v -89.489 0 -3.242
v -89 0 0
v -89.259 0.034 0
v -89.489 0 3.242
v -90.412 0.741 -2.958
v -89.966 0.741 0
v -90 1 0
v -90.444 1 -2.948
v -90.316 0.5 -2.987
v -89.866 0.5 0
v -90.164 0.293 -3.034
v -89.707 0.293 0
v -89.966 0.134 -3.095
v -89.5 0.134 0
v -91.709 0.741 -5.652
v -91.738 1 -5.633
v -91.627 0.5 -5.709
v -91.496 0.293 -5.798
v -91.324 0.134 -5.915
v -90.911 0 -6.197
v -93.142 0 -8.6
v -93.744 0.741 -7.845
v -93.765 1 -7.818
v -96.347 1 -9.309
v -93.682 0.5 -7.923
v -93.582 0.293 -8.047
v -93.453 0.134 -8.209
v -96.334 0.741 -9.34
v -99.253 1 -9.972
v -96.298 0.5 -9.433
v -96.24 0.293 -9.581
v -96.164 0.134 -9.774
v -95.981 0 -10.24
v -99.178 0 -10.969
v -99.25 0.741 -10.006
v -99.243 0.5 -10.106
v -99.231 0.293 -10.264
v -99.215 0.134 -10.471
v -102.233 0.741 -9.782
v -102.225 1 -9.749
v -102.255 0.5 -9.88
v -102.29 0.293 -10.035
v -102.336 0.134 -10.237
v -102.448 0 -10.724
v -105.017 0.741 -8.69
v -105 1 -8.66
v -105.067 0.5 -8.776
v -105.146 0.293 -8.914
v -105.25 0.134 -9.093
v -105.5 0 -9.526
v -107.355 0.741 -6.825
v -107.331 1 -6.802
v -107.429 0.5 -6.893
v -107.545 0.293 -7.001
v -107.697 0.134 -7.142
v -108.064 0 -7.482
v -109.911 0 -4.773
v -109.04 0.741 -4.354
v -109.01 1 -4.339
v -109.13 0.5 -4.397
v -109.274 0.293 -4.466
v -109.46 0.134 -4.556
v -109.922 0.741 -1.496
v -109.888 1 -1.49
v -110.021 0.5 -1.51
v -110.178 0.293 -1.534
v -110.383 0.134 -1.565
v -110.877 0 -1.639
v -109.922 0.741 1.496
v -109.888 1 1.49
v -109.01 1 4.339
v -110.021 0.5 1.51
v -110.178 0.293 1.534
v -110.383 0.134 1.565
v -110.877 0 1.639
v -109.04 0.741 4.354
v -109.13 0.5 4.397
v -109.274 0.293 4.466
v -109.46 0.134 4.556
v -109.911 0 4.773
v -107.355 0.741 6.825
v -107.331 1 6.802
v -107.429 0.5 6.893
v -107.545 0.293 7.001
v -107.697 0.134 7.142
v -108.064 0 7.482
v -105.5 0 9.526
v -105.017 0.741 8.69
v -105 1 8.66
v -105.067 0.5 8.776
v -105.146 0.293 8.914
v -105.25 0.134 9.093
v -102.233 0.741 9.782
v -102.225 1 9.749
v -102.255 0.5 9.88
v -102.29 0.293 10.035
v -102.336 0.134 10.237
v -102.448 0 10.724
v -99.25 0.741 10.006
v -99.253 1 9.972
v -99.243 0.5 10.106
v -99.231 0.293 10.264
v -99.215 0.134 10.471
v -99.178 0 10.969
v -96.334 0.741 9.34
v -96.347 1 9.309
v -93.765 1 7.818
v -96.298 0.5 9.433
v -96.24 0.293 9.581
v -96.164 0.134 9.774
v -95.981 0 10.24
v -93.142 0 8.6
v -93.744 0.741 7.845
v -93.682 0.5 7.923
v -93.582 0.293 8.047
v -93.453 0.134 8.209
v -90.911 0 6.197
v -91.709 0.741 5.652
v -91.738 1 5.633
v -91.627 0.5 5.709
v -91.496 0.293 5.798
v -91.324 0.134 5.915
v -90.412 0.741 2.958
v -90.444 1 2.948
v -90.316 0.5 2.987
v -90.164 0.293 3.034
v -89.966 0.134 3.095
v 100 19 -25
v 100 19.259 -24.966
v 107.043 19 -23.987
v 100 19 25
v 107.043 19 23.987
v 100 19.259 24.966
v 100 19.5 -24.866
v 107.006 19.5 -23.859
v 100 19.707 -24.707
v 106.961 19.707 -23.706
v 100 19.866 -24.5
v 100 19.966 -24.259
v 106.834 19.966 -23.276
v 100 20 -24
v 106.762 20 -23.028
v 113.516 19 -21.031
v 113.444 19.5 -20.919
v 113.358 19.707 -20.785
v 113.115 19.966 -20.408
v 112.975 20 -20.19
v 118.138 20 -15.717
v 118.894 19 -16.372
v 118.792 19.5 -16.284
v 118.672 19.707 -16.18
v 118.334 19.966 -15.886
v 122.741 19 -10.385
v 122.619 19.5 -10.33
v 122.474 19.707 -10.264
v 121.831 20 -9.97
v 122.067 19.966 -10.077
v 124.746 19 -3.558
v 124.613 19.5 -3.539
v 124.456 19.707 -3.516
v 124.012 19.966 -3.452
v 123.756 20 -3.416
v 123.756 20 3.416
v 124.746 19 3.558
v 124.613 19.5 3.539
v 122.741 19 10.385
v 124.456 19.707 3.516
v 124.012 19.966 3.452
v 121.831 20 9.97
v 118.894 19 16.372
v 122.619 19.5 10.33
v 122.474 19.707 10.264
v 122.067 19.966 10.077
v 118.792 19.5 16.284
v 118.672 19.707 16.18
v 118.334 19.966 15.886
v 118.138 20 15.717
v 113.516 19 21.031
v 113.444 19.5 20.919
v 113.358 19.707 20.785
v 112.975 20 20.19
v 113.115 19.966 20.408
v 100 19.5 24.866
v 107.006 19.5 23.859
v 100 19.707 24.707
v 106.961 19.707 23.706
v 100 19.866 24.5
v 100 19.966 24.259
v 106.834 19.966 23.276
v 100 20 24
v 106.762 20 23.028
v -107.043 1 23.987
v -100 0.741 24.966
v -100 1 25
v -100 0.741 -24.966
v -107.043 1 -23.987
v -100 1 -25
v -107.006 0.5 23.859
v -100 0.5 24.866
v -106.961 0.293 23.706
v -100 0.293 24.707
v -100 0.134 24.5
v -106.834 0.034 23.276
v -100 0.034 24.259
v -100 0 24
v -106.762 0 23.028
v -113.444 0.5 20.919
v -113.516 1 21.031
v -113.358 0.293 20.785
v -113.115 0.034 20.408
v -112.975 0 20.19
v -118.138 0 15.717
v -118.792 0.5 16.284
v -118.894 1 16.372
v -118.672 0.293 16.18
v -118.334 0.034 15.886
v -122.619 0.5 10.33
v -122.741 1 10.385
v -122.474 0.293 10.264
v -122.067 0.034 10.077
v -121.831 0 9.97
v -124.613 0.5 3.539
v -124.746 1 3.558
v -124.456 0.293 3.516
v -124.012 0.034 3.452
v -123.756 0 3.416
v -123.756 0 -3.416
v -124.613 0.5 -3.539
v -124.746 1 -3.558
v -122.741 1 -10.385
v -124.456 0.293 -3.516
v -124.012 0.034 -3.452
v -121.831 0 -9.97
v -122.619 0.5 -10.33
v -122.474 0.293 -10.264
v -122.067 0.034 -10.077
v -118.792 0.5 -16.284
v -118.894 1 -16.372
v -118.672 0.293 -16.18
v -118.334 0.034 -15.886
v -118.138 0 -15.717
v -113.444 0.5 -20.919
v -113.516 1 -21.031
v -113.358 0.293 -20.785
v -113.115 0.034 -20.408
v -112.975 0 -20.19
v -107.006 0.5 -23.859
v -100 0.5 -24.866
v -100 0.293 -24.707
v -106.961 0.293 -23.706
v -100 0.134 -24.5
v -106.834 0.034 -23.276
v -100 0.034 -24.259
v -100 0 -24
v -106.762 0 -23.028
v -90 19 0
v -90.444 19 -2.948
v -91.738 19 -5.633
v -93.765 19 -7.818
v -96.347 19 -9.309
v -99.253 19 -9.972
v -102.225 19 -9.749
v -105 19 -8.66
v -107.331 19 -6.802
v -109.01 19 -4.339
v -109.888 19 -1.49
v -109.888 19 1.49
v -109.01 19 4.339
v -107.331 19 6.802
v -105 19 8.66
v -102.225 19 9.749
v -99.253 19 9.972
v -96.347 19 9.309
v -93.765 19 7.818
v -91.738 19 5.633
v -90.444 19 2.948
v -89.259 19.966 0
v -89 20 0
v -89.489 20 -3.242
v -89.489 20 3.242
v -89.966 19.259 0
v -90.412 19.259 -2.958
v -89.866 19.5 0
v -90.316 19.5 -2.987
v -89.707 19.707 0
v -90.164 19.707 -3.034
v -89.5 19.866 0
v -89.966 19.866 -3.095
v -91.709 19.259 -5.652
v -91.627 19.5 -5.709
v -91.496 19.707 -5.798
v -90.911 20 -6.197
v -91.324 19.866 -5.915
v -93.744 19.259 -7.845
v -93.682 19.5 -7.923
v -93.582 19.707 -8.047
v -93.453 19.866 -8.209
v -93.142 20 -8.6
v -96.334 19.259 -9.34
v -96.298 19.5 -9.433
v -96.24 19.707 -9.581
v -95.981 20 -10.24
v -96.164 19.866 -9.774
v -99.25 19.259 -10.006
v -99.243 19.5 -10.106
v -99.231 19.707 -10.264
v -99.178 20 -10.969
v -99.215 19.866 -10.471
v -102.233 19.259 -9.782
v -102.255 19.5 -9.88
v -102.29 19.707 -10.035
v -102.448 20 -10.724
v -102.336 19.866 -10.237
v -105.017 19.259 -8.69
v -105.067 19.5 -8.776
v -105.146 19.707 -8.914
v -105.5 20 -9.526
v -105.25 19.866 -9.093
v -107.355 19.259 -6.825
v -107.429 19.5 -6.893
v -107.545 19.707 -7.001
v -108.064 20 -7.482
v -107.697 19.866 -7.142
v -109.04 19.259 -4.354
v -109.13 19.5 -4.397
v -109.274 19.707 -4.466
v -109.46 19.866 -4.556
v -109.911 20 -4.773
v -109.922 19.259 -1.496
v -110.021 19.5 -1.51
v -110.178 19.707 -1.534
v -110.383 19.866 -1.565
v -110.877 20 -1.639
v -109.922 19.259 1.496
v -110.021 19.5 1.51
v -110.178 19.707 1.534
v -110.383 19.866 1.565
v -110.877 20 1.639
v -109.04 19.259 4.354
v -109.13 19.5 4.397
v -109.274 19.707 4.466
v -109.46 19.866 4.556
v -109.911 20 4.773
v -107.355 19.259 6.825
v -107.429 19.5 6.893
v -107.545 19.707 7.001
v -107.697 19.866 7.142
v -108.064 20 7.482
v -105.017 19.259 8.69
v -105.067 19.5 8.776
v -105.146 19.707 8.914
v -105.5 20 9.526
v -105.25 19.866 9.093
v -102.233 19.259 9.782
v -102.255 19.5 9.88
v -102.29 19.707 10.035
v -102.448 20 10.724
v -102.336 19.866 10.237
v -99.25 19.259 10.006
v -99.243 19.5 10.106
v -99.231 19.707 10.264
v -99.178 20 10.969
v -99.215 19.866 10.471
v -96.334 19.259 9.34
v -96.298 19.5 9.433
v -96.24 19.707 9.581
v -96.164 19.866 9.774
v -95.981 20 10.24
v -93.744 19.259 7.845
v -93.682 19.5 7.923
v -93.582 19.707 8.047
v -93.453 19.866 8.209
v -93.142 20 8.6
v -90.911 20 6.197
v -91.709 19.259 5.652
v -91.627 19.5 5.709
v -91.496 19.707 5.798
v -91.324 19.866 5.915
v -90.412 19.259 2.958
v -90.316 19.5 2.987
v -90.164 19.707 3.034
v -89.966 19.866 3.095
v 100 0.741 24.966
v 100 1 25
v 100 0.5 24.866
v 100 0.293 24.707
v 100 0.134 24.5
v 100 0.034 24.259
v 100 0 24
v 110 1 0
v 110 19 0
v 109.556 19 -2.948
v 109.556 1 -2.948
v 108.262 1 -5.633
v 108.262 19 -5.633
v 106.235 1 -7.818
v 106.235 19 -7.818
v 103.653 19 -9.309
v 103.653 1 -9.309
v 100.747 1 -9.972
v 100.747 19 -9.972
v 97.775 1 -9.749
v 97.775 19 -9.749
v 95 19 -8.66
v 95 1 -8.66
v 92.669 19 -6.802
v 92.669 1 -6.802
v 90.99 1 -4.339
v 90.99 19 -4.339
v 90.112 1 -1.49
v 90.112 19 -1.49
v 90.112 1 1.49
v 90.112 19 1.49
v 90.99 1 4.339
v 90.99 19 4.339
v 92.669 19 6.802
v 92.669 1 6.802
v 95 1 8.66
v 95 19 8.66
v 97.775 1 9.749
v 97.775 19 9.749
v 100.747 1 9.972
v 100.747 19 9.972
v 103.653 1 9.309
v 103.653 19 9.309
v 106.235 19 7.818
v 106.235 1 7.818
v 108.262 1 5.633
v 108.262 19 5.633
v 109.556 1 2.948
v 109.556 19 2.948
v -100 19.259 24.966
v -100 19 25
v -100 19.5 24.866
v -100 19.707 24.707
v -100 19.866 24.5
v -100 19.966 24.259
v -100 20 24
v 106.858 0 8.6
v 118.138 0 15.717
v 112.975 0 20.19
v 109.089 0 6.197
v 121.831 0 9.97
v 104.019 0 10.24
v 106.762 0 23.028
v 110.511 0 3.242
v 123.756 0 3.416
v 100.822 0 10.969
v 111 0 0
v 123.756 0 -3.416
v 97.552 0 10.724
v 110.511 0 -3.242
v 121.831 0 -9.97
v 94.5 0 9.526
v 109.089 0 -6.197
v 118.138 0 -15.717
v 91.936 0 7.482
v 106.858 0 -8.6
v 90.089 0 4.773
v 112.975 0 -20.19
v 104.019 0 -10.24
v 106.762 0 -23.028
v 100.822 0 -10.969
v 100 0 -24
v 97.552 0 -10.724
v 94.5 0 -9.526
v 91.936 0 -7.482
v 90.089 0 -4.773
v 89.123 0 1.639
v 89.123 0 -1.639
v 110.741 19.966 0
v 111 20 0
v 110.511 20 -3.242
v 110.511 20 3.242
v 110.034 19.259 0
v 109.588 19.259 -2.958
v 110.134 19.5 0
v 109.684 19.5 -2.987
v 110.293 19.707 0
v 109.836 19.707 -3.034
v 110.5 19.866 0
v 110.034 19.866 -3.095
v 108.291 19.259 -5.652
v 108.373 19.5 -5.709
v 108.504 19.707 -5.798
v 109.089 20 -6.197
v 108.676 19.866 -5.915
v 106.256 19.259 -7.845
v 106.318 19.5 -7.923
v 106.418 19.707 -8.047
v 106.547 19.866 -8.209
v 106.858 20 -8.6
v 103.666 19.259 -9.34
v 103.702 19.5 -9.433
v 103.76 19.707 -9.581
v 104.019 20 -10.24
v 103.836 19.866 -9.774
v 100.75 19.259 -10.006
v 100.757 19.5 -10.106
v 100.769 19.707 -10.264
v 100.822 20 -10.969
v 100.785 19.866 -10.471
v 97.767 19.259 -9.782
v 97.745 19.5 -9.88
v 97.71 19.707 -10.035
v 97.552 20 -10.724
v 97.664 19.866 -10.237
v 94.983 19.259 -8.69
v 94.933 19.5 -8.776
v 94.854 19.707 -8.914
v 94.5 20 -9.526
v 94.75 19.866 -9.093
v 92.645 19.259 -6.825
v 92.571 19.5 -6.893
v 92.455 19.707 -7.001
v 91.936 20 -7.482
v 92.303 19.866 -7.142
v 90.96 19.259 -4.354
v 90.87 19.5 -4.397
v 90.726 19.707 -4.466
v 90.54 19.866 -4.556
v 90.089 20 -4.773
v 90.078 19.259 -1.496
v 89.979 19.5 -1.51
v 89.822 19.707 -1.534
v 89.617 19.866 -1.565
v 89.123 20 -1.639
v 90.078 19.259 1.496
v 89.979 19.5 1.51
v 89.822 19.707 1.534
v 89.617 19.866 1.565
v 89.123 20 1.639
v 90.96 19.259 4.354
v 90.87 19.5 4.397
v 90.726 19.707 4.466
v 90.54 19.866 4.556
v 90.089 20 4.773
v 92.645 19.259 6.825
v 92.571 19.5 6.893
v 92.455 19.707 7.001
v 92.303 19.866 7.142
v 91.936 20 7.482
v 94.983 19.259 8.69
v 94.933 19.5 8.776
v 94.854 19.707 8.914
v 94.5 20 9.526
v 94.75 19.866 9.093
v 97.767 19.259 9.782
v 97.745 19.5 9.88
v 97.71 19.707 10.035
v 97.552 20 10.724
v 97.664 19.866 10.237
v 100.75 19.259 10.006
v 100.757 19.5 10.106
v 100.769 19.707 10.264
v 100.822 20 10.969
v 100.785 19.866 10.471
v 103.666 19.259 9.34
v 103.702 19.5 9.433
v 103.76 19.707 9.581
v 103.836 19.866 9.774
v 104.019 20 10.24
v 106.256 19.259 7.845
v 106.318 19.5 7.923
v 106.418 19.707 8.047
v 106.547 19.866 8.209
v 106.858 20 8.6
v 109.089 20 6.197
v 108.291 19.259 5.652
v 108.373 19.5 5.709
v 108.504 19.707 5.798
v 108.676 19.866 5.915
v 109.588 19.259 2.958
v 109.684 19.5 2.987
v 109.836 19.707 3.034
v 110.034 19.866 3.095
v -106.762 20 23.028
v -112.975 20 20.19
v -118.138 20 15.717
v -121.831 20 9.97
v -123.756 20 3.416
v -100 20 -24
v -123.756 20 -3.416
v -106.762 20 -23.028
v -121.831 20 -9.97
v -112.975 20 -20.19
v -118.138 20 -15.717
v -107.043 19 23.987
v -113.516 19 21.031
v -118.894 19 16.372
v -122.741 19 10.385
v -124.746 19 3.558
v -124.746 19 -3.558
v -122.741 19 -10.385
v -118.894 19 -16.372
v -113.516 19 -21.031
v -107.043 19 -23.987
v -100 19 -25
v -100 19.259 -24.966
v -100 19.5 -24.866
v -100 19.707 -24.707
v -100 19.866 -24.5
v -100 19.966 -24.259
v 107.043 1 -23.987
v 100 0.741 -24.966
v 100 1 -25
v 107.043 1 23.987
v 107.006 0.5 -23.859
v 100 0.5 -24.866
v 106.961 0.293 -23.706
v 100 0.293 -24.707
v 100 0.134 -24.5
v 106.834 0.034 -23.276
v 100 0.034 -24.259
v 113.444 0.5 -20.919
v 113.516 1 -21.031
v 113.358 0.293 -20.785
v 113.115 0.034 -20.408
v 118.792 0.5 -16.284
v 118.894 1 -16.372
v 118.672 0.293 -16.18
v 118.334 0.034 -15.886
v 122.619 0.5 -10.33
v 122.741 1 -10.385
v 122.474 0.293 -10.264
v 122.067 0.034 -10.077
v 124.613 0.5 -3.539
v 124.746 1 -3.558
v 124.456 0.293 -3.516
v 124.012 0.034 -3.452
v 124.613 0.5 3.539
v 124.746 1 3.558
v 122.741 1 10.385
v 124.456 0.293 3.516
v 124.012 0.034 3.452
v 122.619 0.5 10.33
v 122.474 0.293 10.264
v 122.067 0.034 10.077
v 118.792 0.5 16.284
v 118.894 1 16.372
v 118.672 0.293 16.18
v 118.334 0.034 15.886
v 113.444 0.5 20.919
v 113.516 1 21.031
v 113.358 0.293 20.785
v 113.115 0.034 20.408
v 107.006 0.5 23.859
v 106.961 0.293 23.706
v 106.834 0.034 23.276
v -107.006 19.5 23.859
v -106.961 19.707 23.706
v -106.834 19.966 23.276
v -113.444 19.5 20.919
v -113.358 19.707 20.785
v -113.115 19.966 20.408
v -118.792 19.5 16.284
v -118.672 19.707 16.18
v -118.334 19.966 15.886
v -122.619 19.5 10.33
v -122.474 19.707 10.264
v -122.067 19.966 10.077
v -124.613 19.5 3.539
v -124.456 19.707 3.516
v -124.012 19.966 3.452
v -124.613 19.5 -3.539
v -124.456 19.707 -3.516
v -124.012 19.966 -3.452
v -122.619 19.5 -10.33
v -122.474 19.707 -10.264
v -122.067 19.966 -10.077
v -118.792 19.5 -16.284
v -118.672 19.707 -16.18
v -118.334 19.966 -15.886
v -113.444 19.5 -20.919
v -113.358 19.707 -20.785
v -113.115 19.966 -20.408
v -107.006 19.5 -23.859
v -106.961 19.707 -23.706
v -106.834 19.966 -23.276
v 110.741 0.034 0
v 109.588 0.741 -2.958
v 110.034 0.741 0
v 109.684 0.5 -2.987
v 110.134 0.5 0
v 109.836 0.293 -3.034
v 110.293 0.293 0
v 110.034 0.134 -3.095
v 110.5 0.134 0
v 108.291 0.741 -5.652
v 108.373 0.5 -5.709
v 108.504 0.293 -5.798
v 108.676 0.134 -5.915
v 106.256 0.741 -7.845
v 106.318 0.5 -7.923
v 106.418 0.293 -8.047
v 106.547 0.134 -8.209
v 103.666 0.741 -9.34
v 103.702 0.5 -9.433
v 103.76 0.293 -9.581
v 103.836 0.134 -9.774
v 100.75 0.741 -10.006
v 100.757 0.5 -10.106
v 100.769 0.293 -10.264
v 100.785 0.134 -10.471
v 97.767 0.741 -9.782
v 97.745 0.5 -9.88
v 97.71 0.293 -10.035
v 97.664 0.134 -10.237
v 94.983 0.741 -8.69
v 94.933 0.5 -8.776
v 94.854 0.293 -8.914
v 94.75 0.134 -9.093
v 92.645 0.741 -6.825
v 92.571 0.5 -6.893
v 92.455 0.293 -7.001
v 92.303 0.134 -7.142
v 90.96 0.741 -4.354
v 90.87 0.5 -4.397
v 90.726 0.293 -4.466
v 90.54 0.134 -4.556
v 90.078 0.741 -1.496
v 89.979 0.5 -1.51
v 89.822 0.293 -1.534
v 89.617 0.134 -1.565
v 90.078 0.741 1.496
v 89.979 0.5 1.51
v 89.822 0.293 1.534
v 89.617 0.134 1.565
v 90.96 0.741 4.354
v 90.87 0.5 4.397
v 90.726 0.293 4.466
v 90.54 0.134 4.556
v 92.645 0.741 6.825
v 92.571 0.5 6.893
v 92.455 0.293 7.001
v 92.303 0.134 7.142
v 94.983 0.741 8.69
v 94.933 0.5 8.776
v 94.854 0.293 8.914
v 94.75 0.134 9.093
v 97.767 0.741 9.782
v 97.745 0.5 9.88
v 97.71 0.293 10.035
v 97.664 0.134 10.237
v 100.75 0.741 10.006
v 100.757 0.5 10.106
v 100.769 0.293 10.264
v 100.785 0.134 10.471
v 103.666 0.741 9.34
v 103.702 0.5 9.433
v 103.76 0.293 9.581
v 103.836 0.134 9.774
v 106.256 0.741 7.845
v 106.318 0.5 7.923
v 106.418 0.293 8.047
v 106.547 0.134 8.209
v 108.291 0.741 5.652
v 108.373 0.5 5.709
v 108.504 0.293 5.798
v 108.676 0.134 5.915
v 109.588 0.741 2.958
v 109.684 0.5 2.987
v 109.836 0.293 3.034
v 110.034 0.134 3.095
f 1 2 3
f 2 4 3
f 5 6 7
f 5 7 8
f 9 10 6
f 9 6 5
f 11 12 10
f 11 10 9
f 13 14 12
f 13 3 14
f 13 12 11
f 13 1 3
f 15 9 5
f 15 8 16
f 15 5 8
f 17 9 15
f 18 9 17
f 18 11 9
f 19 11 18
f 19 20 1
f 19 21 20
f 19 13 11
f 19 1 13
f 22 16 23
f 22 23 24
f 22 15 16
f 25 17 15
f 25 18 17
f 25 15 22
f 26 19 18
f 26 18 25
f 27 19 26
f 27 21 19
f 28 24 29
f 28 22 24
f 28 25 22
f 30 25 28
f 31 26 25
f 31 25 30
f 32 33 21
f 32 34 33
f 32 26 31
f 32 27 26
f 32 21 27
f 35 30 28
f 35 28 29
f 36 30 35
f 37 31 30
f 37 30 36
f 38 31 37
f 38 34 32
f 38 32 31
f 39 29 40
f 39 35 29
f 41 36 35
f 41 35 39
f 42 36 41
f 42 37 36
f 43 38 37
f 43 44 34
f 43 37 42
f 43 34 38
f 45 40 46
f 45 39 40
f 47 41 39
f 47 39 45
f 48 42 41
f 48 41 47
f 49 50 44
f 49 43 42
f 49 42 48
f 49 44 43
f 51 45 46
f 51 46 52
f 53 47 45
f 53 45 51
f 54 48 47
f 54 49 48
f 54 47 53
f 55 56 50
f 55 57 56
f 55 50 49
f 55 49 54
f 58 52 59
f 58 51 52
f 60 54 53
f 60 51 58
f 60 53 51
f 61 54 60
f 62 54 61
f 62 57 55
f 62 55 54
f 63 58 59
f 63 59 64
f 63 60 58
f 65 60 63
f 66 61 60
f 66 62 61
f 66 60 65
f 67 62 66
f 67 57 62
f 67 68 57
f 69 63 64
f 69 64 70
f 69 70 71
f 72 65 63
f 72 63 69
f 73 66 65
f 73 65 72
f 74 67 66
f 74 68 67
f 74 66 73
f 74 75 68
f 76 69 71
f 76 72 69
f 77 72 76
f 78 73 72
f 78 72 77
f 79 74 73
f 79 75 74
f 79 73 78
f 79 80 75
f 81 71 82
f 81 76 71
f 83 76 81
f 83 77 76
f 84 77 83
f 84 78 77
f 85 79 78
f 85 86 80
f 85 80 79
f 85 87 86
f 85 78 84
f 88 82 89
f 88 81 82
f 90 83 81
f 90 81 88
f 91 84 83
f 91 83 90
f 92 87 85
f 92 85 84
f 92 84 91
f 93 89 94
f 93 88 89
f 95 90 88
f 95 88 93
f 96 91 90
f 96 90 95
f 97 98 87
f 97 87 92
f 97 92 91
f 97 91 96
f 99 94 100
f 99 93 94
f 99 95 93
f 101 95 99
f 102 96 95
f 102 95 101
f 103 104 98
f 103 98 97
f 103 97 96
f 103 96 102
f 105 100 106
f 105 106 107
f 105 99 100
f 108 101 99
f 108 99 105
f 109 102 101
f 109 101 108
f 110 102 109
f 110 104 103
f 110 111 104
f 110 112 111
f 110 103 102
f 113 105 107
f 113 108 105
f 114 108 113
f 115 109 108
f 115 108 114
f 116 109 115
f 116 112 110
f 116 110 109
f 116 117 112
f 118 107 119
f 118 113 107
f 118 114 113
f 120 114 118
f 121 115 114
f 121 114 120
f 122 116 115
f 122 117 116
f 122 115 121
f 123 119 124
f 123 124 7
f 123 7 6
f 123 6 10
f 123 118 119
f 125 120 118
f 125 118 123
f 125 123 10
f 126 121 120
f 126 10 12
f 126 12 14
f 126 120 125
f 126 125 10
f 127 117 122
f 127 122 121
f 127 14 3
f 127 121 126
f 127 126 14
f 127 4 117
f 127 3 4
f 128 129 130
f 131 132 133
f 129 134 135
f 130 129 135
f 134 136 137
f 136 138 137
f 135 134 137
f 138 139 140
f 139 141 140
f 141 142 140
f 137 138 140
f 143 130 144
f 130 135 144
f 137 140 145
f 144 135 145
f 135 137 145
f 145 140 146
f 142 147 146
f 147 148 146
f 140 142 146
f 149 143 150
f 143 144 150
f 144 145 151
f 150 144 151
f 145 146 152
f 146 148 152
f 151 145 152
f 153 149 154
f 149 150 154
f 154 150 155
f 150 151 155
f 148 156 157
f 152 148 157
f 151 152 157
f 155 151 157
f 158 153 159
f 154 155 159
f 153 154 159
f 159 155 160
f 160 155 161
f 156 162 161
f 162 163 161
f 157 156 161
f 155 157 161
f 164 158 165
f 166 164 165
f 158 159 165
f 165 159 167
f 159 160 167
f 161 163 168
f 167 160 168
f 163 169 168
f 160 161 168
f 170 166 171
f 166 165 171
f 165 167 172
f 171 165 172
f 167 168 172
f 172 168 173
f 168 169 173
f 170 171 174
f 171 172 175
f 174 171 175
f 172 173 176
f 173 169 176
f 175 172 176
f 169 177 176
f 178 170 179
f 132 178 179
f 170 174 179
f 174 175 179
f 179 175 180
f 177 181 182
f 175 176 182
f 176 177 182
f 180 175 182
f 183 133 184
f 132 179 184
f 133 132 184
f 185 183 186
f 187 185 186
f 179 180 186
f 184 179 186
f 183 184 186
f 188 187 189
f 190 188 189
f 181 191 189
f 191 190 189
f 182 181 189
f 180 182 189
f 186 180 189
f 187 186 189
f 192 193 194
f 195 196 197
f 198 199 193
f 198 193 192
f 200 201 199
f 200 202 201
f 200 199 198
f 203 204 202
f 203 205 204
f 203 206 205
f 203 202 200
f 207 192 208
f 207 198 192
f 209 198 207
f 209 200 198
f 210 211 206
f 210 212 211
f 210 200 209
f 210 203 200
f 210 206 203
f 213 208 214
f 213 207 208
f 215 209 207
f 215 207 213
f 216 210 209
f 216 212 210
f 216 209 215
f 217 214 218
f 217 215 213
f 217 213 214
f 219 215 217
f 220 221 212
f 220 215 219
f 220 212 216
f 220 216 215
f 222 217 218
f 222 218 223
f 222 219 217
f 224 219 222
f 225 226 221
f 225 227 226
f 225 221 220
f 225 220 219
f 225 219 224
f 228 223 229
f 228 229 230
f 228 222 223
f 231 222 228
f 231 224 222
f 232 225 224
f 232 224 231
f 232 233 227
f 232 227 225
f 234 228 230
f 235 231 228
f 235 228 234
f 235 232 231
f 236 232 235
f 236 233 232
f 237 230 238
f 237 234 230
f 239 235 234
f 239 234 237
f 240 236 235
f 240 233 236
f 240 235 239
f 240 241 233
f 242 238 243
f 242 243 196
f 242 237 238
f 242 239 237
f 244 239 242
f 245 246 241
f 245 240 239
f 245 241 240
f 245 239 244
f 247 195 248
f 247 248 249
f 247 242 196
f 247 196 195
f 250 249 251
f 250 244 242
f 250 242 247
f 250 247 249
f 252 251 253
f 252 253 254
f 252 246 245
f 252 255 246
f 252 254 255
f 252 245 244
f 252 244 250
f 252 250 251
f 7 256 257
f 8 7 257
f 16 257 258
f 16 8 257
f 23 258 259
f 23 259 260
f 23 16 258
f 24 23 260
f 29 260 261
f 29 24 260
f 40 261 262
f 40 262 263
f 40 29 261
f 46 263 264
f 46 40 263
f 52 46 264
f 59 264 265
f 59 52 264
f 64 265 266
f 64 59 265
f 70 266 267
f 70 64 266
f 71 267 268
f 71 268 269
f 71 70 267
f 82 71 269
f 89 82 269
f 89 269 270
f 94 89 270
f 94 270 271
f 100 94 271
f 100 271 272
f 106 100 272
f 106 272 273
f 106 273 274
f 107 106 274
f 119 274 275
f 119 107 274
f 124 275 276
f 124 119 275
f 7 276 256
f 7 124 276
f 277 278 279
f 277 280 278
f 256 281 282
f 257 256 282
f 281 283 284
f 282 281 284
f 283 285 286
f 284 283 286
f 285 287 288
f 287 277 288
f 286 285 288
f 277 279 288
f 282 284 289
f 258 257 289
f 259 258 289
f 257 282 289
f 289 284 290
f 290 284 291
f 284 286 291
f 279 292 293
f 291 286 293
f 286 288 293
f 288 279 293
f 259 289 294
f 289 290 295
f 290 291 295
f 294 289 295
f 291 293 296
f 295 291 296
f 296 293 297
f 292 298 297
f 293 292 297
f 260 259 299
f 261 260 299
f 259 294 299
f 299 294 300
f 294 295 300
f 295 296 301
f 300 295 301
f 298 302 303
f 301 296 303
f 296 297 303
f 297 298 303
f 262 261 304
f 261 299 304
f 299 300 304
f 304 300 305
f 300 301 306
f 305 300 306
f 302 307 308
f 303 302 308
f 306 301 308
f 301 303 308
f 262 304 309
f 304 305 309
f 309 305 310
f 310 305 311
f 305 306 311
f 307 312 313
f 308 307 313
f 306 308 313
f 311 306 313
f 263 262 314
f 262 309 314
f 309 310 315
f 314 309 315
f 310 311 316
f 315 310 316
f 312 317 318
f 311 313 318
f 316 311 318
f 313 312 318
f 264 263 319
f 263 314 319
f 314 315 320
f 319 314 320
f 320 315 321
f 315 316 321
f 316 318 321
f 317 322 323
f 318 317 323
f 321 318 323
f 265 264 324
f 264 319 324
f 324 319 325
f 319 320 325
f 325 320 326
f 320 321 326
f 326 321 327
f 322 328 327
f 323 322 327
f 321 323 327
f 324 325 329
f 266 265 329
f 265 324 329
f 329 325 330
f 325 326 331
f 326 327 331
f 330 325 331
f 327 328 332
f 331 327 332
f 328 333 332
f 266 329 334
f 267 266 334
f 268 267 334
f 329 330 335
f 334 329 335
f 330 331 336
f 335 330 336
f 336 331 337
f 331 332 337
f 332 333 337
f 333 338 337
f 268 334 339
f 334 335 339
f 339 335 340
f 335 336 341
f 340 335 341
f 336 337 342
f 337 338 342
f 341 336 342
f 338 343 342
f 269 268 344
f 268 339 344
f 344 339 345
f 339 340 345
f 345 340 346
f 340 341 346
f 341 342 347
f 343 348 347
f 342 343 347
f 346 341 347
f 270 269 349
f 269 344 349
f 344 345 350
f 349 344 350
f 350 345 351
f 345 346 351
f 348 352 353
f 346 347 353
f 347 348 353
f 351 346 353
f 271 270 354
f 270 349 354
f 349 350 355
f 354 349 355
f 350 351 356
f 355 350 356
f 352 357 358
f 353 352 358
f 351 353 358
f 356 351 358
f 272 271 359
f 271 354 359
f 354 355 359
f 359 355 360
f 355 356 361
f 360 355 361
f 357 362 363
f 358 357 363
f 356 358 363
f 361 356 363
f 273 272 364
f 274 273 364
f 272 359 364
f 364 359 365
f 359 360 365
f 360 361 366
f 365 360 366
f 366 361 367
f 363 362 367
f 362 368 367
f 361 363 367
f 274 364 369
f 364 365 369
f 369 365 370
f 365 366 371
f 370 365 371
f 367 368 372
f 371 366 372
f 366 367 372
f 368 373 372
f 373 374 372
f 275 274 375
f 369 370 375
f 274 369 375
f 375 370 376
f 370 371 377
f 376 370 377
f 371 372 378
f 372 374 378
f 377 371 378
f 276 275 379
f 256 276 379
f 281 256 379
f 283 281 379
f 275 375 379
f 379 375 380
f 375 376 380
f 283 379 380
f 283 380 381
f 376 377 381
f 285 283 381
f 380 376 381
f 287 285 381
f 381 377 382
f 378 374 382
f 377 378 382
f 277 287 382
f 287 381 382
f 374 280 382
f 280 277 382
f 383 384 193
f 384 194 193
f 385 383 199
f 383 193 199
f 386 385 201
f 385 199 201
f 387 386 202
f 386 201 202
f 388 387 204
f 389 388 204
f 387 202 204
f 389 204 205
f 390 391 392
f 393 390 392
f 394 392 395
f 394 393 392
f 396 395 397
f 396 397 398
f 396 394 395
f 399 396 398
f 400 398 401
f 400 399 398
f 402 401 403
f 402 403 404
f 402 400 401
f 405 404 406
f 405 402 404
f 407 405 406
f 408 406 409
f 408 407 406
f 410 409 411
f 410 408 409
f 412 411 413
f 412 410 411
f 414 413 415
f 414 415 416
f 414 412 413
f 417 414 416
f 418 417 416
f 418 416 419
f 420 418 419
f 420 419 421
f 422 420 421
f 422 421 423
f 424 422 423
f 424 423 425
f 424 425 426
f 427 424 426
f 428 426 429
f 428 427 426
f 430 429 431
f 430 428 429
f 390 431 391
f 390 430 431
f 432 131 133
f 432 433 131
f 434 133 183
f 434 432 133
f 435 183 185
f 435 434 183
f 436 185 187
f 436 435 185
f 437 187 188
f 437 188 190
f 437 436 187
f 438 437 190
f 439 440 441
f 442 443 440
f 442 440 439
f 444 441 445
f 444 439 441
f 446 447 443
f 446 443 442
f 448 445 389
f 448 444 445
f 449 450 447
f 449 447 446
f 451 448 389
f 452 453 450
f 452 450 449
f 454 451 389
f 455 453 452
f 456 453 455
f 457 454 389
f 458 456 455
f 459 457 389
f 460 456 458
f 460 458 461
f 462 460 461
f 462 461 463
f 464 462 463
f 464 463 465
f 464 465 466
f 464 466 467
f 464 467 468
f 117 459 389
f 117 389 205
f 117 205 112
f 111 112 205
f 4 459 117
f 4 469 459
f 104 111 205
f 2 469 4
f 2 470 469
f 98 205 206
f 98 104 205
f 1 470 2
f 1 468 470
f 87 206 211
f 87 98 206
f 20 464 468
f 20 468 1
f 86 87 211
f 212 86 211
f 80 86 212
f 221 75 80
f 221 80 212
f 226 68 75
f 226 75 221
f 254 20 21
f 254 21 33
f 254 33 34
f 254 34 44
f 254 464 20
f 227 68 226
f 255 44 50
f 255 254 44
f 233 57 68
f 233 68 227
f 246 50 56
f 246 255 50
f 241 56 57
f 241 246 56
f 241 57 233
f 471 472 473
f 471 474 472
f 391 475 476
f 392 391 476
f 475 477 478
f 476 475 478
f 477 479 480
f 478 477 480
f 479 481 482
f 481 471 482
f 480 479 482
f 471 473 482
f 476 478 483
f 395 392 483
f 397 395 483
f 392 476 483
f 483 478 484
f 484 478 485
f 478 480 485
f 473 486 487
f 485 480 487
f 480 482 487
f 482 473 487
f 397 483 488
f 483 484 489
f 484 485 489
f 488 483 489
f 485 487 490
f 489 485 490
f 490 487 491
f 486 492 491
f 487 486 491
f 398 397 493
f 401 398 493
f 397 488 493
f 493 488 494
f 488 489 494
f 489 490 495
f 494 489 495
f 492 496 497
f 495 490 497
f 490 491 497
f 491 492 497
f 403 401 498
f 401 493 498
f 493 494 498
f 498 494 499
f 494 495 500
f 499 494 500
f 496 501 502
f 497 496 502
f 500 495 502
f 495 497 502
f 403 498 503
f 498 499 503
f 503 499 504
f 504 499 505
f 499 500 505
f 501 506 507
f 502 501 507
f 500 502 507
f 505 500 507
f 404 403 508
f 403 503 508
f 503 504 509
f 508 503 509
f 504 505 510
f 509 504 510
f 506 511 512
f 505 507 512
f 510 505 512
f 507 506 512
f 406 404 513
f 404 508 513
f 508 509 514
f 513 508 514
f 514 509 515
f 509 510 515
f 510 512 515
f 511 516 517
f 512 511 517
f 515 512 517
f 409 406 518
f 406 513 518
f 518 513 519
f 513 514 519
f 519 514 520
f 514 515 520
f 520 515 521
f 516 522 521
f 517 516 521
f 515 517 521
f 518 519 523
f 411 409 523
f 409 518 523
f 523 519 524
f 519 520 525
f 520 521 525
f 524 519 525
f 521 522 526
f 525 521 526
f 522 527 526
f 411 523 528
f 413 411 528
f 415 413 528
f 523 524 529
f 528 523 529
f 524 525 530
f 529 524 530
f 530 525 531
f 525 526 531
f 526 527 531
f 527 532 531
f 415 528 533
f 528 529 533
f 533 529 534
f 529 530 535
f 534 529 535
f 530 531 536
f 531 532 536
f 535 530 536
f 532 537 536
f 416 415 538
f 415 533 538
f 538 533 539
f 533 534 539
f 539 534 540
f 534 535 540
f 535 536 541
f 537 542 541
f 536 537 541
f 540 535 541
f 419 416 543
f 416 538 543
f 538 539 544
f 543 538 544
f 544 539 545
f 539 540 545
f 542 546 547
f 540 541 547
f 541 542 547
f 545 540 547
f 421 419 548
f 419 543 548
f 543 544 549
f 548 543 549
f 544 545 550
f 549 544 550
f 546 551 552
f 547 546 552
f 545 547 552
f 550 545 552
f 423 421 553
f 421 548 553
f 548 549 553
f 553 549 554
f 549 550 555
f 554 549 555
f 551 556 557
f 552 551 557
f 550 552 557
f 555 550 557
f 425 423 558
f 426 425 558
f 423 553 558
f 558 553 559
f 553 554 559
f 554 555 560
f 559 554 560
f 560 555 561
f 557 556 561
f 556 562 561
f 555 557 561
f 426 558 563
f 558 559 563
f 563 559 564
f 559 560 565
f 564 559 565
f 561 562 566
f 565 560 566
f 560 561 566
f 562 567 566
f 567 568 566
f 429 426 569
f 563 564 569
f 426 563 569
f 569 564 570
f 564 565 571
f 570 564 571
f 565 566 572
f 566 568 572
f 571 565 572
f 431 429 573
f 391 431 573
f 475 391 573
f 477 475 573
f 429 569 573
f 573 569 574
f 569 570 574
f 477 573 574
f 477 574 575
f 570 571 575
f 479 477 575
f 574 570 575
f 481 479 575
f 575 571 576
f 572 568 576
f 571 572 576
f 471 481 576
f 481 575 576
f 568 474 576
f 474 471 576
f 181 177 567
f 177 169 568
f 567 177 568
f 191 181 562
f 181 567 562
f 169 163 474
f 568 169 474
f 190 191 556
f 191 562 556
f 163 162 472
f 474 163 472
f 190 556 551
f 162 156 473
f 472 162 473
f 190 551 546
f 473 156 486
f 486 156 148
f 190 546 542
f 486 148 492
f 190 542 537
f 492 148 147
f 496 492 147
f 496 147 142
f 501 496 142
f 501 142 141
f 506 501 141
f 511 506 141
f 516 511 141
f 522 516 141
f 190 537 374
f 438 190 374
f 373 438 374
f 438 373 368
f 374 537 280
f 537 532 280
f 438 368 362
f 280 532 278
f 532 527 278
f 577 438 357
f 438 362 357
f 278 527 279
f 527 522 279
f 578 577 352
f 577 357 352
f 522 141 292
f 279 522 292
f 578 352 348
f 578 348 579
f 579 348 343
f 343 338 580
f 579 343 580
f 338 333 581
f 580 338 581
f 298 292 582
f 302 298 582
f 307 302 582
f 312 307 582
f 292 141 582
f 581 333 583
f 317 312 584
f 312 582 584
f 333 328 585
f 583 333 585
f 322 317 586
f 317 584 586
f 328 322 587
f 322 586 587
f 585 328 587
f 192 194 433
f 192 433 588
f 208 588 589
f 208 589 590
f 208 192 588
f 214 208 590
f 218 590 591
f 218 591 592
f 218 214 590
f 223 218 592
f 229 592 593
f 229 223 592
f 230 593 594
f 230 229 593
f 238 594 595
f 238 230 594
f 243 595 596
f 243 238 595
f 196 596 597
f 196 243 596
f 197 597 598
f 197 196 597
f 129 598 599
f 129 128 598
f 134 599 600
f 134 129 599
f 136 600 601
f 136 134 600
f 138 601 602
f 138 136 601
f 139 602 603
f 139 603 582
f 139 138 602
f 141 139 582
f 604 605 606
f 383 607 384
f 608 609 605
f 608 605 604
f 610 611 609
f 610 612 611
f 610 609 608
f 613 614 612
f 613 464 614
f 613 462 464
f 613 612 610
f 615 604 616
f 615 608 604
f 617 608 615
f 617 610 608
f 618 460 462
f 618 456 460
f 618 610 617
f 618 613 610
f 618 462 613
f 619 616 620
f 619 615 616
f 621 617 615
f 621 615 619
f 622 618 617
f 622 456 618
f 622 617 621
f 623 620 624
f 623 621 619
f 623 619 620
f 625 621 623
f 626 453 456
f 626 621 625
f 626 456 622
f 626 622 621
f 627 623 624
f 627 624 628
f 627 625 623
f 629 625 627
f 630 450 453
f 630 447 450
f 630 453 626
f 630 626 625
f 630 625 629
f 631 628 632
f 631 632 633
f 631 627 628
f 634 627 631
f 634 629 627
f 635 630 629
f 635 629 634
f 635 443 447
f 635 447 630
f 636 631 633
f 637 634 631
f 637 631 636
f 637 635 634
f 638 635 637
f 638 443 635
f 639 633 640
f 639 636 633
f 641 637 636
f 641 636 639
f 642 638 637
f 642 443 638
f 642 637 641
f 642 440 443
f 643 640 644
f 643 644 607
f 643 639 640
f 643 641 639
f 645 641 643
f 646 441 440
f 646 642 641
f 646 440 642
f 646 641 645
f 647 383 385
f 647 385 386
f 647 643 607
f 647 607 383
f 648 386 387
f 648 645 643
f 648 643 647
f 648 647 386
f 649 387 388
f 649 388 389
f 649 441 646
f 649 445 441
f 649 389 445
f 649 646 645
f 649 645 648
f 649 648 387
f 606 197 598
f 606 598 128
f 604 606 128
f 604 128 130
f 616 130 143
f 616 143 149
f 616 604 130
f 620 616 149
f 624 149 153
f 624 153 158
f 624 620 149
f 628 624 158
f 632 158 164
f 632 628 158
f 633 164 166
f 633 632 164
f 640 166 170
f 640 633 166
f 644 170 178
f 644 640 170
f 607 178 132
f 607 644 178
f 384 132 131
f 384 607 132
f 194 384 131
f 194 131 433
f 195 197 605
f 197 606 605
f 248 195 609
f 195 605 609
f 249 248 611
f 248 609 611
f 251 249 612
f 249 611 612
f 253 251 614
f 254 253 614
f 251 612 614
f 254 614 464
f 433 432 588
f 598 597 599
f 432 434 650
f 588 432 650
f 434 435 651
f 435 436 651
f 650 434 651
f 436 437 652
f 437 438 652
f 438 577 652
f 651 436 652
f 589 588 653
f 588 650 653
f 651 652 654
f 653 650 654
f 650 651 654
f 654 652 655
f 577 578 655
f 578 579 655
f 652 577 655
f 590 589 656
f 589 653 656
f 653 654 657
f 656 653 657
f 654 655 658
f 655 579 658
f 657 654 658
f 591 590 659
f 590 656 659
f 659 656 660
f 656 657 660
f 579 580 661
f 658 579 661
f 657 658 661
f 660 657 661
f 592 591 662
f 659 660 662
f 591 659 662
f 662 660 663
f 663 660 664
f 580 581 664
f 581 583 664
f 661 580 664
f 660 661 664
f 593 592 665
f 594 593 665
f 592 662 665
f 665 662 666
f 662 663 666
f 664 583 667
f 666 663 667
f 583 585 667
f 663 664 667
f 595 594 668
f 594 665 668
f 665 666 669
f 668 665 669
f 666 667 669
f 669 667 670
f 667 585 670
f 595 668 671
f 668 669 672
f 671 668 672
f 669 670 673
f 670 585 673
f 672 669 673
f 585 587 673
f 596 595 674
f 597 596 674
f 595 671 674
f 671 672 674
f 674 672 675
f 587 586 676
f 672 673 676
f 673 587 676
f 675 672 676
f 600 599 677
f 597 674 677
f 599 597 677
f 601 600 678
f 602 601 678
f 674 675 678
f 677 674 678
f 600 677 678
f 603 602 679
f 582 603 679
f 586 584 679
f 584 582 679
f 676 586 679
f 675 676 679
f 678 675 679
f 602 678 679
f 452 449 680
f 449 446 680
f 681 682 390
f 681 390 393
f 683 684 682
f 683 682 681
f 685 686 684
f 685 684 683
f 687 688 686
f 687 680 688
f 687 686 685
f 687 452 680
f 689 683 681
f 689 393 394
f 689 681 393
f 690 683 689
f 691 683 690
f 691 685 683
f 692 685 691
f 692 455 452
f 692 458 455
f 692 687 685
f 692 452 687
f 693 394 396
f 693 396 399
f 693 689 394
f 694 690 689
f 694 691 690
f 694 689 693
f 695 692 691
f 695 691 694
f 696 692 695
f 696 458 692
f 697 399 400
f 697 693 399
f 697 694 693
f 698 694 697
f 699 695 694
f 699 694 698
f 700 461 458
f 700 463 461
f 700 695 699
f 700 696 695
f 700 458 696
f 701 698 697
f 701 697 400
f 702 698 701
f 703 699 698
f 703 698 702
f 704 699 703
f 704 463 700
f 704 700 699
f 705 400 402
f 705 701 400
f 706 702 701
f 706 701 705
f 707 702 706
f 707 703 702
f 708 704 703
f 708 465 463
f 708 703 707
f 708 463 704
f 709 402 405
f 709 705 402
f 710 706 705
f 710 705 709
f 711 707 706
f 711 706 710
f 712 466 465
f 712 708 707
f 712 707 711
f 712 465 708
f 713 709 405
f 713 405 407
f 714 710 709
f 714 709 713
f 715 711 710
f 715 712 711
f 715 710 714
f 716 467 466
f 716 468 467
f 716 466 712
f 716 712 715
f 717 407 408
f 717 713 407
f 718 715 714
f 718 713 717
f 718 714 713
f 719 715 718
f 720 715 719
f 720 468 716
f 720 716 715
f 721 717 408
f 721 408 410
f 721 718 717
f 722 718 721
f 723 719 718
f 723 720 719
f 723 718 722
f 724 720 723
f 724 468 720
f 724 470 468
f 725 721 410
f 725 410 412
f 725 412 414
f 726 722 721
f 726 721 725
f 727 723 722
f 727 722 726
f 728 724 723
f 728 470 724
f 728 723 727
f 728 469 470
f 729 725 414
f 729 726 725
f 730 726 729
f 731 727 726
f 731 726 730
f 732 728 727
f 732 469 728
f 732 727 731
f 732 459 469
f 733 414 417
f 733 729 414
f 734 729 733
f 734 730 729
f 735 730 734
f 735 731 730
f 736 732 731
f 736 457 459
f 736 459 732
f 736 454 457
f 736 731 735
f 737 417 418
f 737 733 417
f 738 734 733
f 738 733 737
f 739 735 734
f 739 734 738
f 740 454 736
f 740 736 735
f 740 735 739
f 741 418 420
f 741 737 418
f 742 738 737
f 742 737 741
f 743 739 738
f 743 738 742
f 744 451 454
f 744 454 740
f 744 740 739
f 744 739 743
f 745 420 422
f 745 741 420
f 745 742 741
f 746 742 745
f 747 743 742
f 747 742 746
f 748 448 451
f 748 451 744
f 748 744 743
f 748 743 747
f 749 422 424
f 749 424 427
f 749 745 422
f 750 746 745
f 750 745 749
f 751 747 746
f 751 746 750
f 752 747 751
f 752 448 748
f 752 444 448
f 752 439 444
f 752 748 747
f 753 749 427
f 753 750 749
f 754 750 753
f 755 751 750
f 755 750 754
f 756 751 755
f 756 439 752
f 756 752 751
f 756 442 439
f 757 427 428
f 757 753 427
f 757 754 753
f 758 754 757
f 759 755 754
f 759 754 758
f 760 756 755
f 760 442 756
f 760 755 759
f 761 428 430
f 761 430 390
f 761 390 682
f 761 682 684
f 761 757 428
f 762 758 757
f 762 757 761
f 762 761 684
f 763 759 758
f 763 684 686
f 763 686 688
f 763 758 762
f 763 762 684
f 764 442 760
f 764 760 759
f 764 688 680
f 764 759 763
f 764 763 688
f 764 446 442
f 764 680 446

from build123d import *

# Parameters (mm, degrees)
SKETCH1_R           = 10
BOSS_EXTRUDE1_DEPTH = 20
FILLET1_R           = 1


with BuildPart() as part:
    # Sketch1 → Boss-Extrude1 (new body)
    with BuildSketch(Plane(origin=(0, 0, 0), x_dir=(1, 0, 0), z_dir=(0, 1, 0))):
        with BuildLine():
            Line((-100, 25), (100, 25))
            ThreePointArc((100, 25), (125, 0), (100, -25))
            Line((100, -25), (-100, -25))
            ThreePointArc((-100, -25), (-125, 0), (-100, 25))
        make_face()
        with Locations((-100, 0)):
            Circle(SKETCH1_R, mode=Mode.SUBTRACT)
        with Locations((100, 0)):
            Circle(SKETCH1_R, mode=Mode.SUBTRACT)
    extrude(amount=BOSS_EXTRUDE1_DEPTH)

    # Fillet1
    fillet1_edges = [part.edges().sort_by_distance(p)[0] for p in [
        (-110, 0, 0),
        (-110, 20, 0),
        (125, 20, 0),
        (90, 0, 0),
        (90, 20, 0),
        (0, 20, -25),
        (-125, 20, 0),
        (0, 0, -25),
        (125, 0, 0),
        (0, 0, 25),
        (-125, 0, 0),
        (0, 20, 25),
    ]]
    fillet(fillet1_edges, radius=FILLET1_R)


solid = part.part
